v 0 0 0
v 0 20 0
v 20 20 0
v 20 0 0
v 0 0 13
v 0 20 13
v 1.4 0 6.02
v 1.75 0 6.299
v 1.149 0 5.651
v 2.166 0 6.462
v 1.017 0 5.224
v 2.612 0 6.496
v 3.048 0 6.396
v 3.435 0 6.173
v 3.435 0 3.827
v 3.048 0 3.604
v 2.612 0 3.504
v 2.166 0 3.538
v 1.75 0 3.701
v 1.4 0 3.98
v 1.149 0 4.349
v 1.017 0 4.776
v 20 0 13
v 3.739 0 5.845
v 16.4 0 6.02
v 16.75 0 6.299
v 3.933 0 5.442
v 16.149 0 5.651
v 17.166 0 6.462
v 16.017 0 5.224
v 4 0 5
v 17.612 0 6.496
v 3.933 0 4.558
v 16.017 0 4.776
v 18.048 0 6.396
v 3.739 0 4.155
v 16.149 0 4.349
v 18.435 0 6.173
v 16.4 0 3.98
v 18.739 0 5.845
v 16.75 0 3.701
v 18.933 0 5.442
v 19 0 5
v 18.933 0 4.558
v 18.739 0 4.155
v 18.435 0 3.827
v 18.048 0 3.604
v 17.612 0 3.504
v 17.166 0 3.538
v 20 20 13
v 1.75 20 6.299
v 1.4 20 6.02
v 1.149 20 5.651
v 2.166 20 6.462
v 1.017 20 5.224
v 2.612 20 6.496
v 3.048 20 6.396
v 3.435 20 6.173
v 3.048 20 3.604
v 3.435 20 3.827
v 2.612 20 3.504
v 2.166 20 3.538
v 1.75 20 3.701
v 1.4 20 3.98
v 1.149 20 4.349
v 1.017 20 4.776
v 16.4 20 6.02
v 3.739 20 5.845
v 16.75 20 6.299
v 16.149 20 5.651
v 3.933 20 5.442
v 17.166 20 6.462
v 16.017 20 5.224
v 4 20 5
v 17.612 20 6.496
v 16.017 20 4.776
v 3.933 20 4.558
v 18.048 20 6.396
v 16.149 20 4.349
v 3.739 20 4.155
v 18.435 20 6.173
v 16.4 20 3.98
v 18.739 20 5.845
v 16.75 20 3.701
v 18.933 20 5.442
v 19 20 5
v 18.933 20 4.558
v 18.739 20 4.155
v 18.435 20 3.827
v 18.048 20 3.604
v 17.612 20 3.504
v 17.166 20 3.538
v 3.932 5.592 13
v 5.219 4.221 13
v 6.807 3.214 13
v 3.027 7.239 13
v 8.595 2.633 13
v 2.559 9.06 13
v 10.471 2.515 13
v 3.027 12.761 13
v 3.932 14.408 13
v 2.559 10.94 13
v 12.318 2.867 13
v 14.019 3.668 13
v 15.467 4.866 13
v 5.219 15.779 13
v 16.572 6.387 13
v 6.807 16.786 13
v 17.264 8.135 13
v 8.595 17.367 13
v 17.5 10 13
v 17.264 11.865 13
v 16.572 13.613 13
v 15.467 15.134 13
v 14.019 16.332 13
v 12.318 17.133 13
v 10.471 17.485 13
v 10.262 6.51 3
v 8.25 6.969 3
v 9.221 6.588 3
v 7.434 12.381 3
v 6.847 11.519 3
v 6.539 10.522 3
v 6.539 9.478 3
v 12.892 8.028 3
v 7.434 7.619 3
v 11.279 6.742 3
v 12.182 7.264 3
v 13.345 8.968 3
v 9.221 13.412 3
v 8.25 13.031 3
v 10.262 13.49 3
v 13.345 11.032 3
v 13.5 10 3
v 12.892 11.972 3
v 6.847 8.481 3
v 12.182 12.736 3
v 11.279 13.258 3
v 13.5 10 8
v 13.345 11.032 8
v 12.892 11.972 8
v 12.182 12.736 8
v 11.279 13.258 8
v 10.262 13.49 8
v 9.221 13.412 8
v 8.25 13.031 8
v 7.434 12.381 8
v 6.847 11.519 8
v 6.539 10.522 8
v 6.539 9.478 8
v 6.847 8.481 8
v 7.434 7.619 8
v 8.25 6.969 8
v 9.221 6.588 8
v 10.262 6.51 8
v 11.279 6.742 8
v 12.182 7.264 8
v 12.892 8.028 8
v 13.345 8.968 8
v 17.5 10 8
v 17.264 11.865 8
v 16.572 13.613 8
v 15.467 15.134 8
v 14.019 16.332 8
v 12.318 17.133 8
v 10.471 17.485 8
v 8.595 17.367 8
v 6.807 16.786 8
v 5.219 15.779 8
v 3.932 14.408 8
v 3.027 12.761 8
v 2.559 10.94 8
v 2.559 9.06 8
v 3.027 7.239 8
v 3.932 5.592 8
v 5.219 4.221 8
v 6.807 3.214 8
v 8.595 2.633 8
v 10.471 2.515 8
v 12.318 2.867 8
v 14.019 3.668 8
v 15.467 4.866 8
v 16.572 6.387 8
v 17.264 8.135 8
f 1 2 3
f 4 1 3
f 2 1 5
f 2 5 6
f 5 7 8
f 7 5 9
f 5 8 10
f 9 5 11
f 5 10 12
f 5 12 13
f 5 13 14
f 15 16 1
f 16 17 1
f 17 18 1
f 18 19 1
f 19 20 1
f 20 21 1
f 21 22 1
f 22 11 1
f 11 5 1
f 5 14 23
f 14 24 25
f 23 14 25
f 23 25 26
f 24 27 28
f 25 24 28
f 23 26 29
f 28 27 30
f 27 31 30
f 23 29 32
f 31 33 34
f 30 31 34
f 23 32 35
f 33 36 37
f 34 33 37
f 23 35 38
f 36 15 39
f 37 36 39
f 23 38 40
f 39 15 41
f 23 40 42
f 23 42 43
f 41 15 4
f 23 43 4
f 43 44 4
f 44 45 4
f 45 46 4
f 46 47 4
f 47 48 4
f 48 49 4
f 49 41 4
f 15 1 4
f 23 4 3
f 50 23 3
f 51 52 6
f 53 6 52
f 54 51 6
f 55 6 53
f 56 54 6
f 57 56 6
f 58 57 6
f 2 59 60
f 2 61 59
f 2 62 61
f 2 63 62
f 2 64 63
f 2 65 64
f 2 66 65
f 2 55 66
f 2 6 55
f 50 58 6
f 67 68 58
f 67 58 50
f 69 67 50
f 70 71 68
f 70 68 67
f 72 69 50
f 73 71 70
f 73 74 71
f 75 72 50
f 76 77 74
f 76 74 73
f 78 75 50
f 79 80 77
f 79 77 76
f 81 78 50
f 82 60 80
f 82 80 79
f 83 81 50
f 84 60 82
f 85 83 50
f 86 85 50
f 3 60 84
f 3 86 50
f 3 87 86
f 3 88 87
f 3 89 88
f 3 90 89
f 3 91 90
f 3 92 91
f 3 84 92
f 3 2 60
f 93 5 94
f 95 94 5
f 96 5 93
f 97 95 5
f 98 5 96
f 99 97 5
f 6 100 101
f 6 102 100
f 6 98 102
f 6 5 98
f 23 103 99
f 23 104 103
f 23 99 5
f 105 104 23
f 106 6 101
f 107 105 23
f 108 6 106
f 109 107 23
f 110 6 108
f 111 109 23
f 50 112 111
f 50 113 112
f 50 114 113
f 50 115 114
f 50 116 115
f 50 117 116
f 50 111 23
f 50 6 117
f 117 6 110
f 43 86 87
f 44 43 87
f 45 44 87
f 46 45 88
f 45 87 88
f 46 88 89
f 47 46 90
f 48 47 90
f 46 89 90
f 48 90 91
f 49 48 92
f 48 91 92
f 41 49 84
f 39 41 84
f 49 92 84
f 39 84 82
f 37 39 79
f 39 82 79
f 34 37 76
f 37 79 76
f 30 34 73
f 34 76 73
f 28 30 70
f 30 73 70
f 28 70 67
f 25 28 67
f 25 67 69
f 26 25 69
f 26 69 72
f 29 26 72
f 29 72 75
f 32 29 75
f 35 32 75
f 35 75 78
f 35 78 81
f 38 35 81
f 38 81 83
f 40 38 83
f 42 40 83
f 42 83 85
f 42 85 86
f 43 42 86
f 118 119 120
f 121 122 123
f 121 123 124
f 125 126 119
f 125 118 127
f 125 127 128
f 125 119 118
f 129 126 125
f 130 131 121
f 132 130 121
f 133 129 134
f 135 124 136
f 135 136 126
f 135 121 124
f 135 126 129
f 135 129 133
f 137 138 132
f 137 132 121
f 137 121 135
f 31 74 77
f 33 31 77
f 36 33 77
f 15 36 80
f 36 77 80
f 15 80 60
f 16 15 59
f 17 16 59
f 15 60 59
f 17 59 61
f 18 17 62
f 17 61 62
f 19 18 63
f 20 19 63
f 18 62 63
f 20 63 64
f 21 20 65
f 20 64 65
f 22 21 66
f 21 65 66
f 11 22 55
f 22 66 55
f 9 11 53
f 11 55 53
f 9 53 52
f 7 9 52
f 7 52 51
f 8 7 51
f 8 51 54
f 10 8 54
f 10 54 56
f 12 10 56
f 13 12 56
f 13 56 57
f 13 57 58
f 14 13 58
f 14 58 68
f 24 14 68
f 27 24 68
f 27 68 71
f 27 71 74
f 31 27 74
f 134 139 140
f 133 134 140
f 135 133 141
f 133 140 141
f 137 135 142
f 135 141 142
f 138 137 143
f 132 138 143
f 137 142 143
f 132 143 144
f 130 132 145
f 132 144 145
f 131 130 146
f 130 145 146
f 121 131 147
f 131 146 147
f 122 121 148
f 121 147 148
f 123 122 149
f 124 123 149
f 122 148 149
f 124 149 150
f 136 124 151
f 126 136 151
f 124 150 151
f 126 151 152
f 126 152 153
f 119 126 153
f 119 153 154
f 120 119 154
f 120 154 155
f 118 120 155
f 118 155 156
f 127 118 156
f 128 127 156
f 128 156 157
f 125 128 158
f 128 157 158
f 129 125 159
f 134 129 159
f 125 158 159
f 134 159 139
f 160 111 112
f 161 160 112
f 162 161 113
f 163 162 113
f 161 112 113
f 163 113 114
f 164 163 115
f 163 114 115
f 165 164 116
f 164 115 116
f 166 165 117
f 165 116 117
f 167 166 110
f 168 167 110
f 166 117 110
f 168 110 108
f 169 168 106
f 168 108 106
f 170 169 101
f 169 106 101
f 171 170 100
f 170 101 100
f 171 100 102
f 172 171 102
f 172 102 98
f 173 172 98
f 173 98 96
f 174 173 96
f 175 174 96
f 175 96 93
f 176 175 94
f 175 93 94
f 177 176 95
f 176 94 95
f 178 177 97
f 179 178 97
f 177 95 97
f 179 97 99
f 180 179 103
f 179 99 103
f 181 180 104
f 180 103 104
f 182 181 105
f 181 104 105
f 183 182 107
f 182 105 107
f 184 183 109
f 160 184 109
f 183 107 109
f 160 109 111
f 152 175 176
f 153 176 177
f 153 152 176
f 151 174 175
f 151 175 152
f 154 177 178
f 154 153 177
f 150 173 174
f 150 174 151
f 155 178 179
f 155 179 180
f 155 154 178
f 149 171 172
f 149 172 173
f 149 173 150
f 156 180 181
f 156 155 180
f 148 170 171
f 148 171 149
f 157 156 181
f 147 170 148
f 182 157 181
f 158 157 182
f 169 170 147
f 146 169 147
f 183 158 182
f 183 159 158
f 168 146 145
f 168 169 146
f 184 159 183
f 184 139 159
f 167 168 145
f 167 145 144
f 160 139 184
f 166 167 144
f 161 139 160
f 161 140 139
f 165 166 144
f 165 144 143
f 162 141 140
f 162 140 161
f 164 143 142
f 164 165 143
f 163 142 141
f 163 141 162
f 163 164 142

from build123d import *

# Parameters (mm, degrees)
ESQUISSE1_W             = 20
ESQUISSE1_H             = 20
BOSS_EXTRU_1_DEPTH      = 13
ESQUISSE2_R             = 7.5
ENL_V_MAT_EXTRU_1_DEPTH = 5
ESQUISSE3_R             = 3.5
ENL_V_MAT_EXTRU_2_DEPTH = 5
ESQUISSE4_R             = 1.5
ENL_V_MAT_EXTRU_3_DEPTH = 21


with BuildPart() as part:
    # Esquisse1 → Boss.-Extru.1 (new body)
    with BuildSketch(Plane.XY):
        with Locations((10, 10)):
            Rectangle(ESQUISSE1_W, ESQUISSE1_H)
    extrude(amount=BOSS_EXTRU_1_DEPTH)

    # Esquisse2 → Enlèv. mat.-Extru.1 (cut)
    with BuildSketch(Plane.XY.offset(13)):
        with Locations((10, 10)):
            Circle(ESQUISSE2_R)
    extrude(amount=-ENL_V_MAT_EXTRU_1_DEPTH, mode=Mode.SUBTRACT)

    # Esquisse3 → Enlèv. mat.-Extru.2 (cut)
    with BuildSketch(Plane.XY.offset(8)):
        with Locations((10, 10)):
            Circle(ESQUISSE3_R)
    extrude(amount=-ENL_V_MAT_EXTRU_2_DEPTH, mode=Mode.SUBTRACT)

    # Esquisse4 → Enlèv. mat.-Extru.3 (cut, through all)
    with BuildSketch(Plane(origin=(0, 20, 0), x_dir=(1, 0, 0), z_dir=(0, 1, 0))):
        with Locations((17.5, -5)):
            Circle(ESQUISSE4_R)
        with Locations((2.5, -5)):
            Circle(ESQUISSE4_R)
    extrude(amount=-ENL_V_MAT_EXTRU_3_DEPTH, mode=Mode.SUBTRACT)


solid = part.part
